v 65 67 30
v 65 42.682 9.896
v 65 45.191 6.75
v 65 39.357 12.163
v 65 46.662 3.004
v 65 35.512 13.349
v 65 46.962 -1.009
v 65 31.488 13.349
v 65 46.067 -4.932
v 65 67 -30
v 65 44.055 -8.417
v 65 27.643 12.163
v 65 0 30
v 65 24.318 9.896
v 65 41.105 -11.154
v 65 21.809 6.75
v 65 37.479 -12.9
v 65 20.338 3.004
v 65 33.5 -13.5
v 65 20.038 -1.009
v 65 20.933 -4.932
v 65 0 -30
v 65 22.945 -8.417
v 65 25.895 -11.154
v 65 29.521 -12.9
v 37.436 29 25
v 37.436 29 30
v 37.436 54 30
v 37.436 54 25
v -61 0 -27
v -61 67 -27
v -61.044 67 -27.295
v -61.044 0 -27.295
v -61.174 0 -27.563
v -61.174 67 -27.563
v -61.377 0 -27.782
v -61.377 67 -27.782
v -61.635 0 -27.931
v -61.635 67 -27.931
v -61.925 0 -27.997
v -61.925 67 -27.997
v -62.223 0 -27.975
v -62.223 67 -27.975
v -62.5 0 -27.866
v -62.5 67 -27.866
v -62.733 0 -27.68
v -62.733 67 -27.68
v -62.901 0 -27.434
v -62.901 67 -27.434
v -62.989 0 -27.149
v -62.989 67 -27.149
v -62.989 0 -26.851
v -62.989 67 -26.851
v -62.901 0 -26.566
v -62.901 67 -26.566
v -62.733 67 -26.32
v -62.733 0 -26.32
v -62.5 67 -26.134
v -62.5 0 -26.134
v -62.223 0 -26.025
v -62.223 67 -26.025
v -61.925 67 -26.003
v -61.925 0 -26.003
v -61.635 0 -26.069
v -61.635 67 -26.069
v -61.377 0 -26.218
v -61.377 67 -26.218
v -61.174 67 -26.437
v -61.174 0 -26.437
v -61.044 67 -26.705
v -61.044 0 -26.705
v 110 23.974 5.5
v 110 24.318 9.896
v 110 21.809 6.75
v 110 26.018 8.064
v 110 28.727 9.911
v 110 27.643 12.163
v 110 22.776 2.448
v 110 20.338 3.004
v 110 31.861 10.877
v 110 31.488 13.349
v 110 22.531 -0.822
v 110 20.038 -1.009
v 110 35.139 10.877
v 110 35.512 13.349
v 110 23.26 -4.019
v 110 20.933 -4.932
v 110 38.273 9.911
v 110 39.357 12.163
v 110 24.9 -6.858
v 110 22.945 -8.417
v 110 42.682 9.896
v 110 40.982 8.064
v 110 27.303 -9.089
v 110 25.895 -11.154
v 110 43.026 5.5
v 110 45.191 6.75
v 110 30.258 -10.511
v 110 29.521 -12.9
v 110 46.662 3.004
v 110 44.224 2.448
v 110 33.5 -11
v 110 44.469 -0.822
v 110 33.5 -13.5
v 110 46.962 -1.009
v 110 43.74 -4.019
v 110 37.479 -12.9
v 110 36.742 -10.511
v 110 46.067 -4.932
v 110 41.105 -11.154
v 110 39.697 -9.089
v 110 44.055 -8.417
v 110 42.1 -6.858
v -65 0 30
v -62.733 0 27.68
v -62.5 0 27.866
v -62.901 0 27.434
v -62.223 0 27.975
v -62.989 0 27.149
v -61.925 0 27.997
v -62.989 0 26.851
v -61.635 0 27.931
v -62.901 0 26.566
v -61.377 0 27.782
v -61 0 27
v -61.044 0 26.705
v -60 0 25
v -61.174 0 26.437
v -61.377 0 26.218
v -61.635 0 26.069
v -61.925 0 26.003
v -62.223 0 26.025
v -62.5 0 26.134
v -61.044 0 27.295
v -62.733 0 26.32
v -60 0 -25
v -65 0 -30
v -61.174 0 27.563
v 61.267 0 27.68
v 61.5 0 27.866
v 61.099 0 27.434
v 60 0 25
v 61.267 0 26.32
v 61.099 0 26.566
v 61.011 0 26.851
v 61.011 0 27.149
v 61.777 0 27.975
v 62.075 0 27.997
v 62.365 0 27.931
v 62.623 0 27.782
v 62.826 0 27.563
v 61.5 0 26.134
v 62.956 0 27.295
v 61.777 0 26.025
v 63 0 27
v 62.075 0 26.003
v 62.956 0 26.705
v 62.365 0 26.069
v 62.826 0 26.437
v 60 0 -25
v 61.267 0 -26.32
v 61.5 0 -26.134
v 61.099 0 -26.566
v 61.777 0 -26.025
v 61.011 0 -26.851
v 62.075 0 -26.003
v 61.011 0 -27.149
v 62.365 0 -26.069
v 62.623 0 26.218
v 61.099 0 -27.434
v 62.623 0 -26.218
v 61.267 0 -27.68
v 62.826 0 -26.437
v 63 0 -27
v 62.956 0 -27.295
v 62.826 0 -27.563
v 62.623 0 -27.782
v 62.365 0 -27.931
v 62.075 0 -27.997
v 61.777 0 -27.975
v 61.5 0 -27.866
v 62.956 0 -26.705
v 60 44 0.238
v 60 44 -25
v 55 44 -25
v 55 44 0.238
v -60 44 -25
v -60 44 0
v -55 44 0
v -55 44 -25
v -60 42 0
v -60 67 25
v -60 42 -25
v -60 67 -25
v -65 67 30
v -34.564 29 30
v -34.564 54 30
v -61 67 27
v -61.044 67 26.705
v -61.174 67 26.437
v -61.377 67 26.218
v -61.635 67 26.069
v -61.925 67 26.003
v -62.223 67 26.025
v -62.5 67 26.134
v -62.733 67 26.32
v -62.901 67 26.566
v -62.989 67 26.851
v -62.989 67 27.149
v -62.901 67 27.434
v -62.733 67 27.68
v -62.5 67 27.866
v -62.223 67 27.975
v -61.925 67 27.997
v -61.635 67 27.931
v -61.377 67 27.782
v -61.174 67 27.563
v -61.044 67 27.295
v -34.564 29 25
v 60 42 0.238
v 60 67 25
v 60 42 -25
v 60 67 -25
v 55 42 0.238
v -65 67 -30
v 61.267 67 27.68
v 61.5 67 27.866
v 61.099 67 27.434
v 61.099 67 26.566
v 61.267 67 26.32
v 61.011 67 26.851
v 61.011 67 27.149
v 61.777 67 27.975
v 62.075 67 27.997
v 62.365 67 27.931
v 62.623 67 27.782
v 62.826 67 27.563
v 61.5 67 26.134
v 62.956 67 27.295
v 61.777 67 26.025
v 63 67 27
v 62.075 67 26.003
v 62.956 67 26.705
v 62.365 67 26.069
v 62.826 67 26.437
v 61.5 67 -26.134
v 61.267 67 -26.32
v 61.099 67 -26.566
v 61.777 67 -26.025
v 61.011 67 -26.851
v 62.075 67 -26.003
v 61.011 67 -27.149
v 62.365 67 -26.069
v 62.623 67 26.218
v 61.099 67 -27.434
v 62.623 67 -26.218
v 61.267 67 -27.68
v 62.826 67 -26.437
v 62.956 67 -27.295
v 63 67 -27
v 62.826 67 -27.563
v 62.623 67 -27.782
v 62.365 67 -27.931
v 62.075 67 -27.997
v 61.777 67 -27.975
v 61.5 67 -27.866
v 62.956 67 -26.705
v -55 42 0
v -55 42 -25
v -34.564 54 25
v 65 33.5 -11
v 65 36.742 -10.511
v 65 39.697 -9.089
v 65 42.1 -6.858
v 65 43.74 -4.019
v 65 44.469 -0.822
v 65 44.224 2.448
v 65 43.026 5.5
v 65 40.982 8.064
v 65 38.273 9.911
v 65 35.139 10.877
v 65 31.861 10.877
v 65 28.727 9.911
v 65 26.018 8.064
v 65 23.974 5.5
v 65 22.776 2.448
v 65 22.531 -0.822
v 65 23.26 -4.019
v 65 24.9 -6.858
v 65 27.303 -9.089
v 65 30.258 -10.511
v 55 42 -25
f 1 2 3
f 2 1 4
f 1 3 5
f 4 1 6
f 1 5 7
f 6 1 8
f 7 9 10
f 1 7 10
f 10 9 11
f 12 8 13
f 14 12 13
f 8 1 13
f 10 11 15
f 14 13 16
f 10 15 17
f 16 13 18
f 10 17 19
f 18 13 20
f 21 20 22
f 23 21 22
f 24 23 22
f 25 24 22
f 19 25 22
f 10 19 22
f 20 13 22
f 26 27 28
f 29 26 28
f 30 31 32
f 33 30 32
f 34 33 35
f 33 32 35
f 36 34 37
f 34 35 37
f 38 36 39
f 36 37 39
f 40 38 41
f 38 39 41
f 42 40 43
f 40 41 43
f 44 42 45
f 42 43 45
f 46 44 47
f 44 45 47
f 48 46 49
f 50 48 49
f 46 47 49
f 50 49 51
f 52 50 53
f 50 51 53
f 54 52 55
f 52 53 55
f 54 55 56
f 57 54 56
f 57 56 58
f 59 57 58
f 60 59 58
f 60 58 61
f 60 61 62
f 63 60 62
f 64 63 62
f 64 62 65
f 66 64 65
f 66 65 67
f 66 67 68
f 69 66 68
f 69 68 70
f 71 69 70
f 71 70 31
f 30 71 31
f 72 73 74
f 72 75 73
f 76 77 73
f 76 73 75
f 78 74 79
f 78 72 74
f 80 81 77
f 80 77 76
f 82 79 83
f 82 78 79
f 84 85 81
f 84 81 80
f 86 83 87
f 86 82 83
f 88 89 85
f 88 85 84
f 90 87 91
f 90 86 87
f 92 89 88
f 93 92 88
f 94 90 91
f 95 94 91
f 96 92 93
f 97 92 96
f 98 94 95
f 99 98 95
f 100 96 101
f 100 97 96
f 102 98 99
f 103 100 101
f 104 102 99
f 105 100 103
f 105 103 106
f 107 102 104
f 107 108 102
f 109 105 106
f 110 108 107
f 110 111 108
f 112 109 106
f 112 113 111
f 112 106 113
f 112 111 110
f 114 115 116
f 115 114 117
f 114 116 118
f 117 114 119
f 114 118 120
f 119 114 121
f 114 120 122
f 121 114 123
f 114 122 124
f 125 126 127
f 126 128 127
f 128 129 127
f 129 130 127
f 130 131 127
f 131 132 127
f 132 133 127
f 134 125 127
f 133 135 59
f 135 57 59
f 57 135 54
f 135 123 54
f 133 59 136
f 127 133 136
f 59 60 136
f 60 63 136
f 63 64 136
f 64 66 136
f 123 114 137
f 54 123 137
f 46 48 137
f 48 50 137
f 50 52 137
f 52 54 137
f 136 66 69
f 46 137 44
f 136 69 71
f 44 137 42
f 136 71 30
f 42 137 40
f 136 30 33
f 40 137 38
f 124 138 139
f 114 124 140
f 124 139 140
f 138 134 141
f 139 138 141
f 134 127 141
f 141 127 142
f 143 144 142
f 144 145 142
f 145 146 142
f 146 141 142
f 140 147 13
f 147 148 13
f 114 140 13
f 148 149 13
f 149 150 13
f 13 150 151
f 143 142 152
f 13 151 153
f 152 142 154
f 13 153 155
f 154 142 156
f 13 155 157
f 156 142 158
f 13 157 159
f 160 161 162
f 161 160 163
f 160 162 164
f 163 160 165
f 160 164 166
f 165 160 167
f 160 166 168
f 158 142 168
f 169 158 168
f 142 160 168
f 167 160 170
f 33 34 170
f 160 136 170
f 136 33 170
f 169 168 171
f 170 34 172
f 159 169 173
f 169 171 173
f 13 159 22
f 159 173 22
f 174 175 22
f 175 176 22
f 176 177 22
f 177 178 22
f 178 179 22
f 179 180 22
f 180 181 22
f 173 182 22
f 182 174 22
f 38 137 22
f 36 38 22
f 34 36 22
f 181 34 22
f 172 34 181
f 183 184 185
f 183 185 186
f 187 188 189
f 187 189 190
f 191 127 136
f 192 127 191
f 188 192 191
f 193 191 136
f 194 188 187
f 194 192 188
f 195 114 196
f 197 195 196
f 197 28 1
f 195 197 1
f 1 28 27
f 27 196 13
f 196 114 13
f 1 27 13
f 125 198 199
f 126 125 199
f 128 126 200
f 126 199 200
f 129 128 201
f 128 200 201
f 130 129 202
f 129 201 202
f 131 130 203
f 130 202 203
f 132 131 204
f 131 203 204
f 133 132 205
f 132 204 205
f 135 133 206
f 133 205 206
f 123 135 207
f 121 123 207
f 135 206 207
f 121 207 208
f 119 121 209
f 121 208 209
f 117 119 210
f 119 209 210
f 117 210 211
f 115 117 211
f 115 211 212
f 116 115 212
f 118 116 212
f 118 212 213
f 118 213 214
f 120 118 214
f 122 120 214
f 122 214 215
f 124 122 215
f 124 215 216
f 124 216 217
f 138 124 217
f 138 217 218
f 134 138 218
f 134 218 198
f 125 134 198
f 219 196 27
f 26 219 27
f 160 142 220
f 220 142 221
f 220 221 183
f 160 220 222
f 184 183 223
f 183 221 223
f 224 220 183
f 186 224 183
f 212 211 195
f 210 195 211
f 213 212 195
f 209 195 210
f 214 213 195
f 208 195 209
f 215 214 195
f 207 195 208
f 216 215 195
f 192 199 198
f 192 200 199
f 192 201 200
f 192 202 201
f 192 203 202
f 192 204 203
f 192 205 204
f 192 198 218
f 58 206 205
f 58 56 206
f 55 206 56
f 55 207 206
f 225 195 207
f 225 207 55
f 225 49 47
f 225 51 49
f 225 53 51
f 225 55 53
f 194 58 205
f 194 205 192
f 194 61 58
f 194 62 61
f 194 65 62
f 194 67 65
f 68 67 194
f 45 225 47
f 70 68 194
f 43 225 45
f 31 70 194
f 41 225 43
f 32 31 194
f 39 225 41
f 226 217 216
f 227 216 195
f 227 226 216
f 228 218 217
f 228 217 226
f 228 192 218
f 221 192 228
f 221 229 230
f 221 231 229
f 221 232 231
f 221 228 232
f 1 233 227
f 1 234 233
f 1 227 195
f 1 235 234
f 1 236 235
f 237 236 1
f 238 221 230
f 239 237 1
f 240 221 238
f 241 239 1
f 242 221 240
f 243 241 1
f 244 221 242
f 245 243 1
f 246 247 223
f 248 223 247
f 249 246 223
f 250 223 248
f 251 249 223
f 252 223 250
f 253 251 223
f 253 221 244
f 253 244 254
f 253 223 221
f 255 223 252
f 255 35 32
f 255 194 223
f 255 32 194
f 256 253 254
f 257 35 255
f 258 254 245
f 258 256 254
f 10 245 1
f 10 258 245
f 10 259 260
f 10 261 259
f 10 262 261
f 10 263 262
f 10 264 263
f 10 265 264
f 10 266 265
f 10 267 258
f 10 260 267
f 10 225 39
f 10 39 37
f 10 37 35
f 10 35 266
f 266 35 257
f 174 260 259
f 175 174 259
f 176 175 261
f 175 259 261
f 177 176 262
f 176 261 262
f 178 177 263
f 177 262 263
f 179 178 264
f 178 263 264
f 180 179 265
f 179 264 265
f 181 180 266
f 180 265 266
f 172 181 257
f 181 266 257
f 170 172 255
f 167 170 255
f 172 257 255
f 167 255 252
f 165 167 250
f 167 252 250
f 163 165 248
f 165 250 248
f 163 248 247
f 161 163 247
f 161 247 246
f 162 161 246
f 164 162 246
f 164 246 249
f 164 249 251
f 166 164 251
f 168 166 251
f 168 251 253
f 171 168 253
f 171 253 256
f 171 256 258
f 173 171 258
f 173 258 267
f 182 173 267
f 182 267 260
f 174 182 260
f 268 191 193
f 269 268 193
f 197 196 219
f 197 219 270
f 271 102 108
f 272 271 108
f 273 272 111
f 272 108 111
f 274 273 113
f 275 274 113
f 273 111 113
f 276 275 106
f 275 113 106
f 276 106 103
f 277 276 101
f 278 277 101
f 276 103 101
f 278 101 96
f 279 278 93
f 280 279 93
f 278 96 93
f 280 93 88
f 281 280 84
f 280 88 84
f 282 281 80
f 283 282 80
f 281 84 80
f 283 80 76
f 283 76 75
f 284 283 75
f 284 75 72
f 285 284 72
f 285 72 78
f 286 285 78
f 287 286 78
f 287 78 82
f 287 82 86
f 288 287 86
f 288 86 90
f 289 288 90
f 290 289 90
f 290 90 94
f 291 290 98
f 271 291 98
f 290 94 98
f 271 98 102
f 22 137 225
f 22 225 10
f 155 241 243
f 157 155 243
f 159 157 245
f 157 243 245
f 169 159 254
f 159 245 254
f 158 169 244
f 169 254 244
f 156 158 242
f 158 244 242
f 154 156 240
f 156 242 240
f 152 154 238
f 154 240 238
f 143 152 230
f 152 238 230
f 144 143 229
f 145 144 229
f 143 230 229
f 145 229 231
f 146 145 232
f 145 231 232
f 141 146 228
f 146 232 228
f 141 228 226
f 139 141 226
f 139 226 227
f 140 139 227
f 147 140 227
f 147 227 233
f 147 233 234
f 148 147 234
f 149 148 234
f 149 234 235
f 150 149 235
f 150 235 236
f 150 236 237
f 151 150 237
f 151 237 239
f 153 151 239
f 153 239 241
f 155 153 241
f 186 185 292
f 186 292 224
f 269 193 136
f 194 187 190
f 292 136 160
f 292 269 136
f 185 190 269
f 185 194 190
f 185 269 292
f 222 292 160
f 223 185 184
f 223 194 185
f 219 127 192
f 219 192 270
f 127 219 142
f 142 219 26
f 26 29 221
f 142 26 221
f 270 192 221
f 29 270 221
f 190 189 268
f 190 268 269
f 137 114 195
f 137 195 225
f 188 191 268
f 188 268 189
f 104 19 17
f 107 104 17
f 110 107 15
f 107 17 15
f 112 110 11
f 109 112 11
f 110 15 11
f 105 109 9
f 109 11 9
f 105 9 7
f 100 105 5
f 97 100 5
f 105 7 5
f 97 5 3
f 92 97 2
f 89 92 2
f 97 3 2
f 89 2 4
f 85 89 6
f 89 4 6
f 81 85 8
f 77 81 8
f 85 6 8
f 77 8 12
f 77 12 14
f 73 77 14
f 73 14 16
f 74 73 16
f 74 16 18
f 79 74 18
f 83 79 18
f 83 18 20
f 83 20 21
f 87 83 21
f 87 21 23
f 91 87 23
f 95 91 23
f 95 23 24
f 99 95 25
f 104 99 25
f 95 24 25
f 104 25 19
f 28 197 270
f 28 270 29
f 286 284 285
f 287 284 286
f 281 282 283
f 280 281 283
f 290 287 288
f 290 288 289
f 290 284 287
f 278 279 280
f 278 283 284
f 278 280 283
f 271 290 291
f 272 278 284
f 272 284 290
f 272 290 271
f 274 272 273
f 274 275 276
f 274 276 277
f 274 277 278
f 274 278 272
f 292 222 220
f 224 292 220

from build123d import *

# Parameters (mm, degrees)
SKETCH1_W           = 130
SKETCH1_H           = 60
BOSS_EXTRUDE1_DEPTH = 67
CUT_EXTRUDE1_REACH  = 69
SKETCH2_W           = 120
SKETCH2_H           = 50
SKETCH4_W           = 27.738428507
SKETCH4_H           = 2
BOSS_EXTRUDE2_DEPTH = 5
SKETCH5_W           = 27.5
SKETCH5_H           = 2
BOSS_EXTRUDE3_DEPTH = 5
CUT_EXTRUDE2_REACH  = 62
SKETCH6_W           = 72
SKETCH6_H           = 25
CUT_EXTRUDE3_REACH  = 69
SKETCH8_R           = 1
SKETCH9_R           = 13.5
BOSS_EXTRUDE4_DEPTH = 45
SKETCH10_R          = 11
CUT_EXTRUDE4_DEPTH  = 45


with BuildPart() as part:
    # Sketch1 → Boss-Extrude1 (new body)
    with BuildSketch(Plane(origin=(0, 0, 0), x_dir=(1, 0, 0), z_dir=(0, 1, 0))):
        Rectangle(SKETCH1_W, SKETCH1_H)
    extrude(amount=BOSS_EXTRUDE1_DEPTH)

    # Sketch2 → Cut-Extrude1 (cut, up to next)
    with BuildSketch(Plane(origin=(0, 67, 0), x_dir=(1, 0, 0), z_dir=(0, 1, 0)), mode=Mode.PRIVATE) as cut_extrude1_sk1:
        Rectangle(SKETCH2_W, SKETCH2_H)
    cut_extrude1_tool1 = extrude(cut_extrude1_sk1.sketch, amount=-CUT_EXTRUDE1_REACH, mode=Mode.PRIVATE) & part.part
    add(cut_extrude1_tool1.solids().sort_by_distance((0, 67, 0))[0], mode=Mode.SUBTRACT)

    # Sketch4 → Boss-Extrude2 (add)
    with BuildSketch(Plane.ZY.offset(-60)):
        with Locations((-13.630785747, 43)):
            Rectangle(SKETCH4_W, SKETCH4_H)
    extrude(amount=BOSS_EXTRUDE2_DEPTH)

    # Sketch5 → Boss-Extrude3 (add)
    with BuildSketch(Plane(origin=(-60, 0, 0), x_dir=(0, 0, -1), z_dir=(1, 0, 0))):
        with Locations((13.75, 43)):
            Rectangle(SKETCH5_W, SKETCH5_H)
    extrude(amount=BOSS_EXTRUDE3_DEPTH)

    # Sketch6 → Cut-Extrude2 (cut, up to next)
    with BuildSketch(Plane.XY.offset(30), mode=Mode.PRIVATE) as cut_extrude2_sk1:
        with Locations((1.435854944, 41.5)):
            Rectangle(SKETCH6_W, SKETCH6_H)
    cut_extrude2_tool1 = extrude(cut_extrude2_sk1.sketch, amount=-CUT_EXTRUDE2_REACH, mode=Mode.PRIVATE) & part.part
    add(cut_extrude2_tool1.solids().sort_by_distance((1.435855, 41.5, 30))[0], mode=Mode.SUBTRACT)

    # Sketch8 → Cut-Extrude3 (cut, up to next)
    with BuildSketch(Plane(origin=(0, 67, 0), x_dir=(1, 0, 0), z_dir=(0, 1, 0)), mode=Mode.PRIVATE) as cut_extrude3_sk1:
        with Locations((-62, 27)):
            Circle(SKETCH8_R)
    cut_extrude3_tool1 = extrude(cut_extrude3_sk1.sketch, amount=-CUT_EXTRUDE3_REACH, mode=Mode.PRIVATE) & part.part
    add(cut_extrude3_tool1.solids().sort_by_distance((-62, 67, -27))[0], mode=Mode.SUBTRACT)
    # Sketch8 → Cut-Extrude3 (cut, up to next)
    with BuildSketch(Plane(origin=(0, 67, 0), x_dir=(1, 0, 0), z_dir=(0, 1, 0)), mode=Mode.PRIVATE) as cut_extrude3_sk2:
        with Locations((62, 27)):
            Circle(SKETCH8_R)
    cut_extrude3_tool2 = extrude(cut_extrude3_sk2.sketch, amount=-CUT_EXTRUDE3_REACH, mode=Mode.PRIVATE) & part.part
    add(cut_extrude3_tool2.solids().sort_by_distance((62, 67, -27))[0], mode=Mode.SUBTRACT)
    # Sketch8 → Cut-Extrude3 (cut, up to next)
    with BuildSketch(Plane(origin=(0, 67, 0), x_dir=(1, 0, 0), z_dir=(0, 1, 0)), mode=Mode.PRIVATE) as cut_extrude3_sk3:
        with Locations((-62, -27)):
            Circle(SKETCH8_R)
    cut_extrude3_tool3 = extrude(cut_extrude3_sk3.sketch, amount=-CUT_EXTRUDE3_REACH, mode=Mode.PRIVATE) & part.part
    add(cut_extrude3_tool3.solids().sort_by_distance((-62, 67, 27))[0], mode=Mode.SUBTRACT)
    # Sketch8 → Cut-Extrude3 (cut, up to next)
    with BuildSketch(Plane(origin=(0, 67, 0), x_dir=(1, 0, 0), z_dir=(0, 1, 0)), mode=Mode.PRIVATE) as cut_extrude3_sk4:
        with Locations((62, -27)):
            Circle(SKETCH8_R)
    cut_extrude3_tool4 = extrude(cut_extrude3_sk4.sketch, amount=-CUT_EXTRUDE3_REACH, mode=Mode.PRIVATE) & part.part
    add(cut_extrude3_tool4.solids().sort_by_distance((62, 67, 27))[0], mode=Mode.SUBTRACT)

    # Sketch9 → Boss-Extrude4 (add)
    with BuildSketch(Plane(origin=(65, 0, 0), x_dir=(0, 0, -1), z_dir=(1, 0, 0))):
        with Locations((0, 33.5)):
            Circle(SKETCH9_R)
    extrude(amount=BOSS_EXTRUDE4_DEPTH)

    # Sketch10 → Cut-Extrude4 (cut)
    with BuildSketch(Plane(origin=(110, 0, 0), x_dir=(0, 0, -1), z_dir=(1, 0, 0))):
        with Locations((0, 33.5)):
            Circle(SKETCH10_R)
    extrude(amount=-CUT_EXTRUDE4_DEPTH, mode=Mode.SUBTRACT)


solid = part.part
